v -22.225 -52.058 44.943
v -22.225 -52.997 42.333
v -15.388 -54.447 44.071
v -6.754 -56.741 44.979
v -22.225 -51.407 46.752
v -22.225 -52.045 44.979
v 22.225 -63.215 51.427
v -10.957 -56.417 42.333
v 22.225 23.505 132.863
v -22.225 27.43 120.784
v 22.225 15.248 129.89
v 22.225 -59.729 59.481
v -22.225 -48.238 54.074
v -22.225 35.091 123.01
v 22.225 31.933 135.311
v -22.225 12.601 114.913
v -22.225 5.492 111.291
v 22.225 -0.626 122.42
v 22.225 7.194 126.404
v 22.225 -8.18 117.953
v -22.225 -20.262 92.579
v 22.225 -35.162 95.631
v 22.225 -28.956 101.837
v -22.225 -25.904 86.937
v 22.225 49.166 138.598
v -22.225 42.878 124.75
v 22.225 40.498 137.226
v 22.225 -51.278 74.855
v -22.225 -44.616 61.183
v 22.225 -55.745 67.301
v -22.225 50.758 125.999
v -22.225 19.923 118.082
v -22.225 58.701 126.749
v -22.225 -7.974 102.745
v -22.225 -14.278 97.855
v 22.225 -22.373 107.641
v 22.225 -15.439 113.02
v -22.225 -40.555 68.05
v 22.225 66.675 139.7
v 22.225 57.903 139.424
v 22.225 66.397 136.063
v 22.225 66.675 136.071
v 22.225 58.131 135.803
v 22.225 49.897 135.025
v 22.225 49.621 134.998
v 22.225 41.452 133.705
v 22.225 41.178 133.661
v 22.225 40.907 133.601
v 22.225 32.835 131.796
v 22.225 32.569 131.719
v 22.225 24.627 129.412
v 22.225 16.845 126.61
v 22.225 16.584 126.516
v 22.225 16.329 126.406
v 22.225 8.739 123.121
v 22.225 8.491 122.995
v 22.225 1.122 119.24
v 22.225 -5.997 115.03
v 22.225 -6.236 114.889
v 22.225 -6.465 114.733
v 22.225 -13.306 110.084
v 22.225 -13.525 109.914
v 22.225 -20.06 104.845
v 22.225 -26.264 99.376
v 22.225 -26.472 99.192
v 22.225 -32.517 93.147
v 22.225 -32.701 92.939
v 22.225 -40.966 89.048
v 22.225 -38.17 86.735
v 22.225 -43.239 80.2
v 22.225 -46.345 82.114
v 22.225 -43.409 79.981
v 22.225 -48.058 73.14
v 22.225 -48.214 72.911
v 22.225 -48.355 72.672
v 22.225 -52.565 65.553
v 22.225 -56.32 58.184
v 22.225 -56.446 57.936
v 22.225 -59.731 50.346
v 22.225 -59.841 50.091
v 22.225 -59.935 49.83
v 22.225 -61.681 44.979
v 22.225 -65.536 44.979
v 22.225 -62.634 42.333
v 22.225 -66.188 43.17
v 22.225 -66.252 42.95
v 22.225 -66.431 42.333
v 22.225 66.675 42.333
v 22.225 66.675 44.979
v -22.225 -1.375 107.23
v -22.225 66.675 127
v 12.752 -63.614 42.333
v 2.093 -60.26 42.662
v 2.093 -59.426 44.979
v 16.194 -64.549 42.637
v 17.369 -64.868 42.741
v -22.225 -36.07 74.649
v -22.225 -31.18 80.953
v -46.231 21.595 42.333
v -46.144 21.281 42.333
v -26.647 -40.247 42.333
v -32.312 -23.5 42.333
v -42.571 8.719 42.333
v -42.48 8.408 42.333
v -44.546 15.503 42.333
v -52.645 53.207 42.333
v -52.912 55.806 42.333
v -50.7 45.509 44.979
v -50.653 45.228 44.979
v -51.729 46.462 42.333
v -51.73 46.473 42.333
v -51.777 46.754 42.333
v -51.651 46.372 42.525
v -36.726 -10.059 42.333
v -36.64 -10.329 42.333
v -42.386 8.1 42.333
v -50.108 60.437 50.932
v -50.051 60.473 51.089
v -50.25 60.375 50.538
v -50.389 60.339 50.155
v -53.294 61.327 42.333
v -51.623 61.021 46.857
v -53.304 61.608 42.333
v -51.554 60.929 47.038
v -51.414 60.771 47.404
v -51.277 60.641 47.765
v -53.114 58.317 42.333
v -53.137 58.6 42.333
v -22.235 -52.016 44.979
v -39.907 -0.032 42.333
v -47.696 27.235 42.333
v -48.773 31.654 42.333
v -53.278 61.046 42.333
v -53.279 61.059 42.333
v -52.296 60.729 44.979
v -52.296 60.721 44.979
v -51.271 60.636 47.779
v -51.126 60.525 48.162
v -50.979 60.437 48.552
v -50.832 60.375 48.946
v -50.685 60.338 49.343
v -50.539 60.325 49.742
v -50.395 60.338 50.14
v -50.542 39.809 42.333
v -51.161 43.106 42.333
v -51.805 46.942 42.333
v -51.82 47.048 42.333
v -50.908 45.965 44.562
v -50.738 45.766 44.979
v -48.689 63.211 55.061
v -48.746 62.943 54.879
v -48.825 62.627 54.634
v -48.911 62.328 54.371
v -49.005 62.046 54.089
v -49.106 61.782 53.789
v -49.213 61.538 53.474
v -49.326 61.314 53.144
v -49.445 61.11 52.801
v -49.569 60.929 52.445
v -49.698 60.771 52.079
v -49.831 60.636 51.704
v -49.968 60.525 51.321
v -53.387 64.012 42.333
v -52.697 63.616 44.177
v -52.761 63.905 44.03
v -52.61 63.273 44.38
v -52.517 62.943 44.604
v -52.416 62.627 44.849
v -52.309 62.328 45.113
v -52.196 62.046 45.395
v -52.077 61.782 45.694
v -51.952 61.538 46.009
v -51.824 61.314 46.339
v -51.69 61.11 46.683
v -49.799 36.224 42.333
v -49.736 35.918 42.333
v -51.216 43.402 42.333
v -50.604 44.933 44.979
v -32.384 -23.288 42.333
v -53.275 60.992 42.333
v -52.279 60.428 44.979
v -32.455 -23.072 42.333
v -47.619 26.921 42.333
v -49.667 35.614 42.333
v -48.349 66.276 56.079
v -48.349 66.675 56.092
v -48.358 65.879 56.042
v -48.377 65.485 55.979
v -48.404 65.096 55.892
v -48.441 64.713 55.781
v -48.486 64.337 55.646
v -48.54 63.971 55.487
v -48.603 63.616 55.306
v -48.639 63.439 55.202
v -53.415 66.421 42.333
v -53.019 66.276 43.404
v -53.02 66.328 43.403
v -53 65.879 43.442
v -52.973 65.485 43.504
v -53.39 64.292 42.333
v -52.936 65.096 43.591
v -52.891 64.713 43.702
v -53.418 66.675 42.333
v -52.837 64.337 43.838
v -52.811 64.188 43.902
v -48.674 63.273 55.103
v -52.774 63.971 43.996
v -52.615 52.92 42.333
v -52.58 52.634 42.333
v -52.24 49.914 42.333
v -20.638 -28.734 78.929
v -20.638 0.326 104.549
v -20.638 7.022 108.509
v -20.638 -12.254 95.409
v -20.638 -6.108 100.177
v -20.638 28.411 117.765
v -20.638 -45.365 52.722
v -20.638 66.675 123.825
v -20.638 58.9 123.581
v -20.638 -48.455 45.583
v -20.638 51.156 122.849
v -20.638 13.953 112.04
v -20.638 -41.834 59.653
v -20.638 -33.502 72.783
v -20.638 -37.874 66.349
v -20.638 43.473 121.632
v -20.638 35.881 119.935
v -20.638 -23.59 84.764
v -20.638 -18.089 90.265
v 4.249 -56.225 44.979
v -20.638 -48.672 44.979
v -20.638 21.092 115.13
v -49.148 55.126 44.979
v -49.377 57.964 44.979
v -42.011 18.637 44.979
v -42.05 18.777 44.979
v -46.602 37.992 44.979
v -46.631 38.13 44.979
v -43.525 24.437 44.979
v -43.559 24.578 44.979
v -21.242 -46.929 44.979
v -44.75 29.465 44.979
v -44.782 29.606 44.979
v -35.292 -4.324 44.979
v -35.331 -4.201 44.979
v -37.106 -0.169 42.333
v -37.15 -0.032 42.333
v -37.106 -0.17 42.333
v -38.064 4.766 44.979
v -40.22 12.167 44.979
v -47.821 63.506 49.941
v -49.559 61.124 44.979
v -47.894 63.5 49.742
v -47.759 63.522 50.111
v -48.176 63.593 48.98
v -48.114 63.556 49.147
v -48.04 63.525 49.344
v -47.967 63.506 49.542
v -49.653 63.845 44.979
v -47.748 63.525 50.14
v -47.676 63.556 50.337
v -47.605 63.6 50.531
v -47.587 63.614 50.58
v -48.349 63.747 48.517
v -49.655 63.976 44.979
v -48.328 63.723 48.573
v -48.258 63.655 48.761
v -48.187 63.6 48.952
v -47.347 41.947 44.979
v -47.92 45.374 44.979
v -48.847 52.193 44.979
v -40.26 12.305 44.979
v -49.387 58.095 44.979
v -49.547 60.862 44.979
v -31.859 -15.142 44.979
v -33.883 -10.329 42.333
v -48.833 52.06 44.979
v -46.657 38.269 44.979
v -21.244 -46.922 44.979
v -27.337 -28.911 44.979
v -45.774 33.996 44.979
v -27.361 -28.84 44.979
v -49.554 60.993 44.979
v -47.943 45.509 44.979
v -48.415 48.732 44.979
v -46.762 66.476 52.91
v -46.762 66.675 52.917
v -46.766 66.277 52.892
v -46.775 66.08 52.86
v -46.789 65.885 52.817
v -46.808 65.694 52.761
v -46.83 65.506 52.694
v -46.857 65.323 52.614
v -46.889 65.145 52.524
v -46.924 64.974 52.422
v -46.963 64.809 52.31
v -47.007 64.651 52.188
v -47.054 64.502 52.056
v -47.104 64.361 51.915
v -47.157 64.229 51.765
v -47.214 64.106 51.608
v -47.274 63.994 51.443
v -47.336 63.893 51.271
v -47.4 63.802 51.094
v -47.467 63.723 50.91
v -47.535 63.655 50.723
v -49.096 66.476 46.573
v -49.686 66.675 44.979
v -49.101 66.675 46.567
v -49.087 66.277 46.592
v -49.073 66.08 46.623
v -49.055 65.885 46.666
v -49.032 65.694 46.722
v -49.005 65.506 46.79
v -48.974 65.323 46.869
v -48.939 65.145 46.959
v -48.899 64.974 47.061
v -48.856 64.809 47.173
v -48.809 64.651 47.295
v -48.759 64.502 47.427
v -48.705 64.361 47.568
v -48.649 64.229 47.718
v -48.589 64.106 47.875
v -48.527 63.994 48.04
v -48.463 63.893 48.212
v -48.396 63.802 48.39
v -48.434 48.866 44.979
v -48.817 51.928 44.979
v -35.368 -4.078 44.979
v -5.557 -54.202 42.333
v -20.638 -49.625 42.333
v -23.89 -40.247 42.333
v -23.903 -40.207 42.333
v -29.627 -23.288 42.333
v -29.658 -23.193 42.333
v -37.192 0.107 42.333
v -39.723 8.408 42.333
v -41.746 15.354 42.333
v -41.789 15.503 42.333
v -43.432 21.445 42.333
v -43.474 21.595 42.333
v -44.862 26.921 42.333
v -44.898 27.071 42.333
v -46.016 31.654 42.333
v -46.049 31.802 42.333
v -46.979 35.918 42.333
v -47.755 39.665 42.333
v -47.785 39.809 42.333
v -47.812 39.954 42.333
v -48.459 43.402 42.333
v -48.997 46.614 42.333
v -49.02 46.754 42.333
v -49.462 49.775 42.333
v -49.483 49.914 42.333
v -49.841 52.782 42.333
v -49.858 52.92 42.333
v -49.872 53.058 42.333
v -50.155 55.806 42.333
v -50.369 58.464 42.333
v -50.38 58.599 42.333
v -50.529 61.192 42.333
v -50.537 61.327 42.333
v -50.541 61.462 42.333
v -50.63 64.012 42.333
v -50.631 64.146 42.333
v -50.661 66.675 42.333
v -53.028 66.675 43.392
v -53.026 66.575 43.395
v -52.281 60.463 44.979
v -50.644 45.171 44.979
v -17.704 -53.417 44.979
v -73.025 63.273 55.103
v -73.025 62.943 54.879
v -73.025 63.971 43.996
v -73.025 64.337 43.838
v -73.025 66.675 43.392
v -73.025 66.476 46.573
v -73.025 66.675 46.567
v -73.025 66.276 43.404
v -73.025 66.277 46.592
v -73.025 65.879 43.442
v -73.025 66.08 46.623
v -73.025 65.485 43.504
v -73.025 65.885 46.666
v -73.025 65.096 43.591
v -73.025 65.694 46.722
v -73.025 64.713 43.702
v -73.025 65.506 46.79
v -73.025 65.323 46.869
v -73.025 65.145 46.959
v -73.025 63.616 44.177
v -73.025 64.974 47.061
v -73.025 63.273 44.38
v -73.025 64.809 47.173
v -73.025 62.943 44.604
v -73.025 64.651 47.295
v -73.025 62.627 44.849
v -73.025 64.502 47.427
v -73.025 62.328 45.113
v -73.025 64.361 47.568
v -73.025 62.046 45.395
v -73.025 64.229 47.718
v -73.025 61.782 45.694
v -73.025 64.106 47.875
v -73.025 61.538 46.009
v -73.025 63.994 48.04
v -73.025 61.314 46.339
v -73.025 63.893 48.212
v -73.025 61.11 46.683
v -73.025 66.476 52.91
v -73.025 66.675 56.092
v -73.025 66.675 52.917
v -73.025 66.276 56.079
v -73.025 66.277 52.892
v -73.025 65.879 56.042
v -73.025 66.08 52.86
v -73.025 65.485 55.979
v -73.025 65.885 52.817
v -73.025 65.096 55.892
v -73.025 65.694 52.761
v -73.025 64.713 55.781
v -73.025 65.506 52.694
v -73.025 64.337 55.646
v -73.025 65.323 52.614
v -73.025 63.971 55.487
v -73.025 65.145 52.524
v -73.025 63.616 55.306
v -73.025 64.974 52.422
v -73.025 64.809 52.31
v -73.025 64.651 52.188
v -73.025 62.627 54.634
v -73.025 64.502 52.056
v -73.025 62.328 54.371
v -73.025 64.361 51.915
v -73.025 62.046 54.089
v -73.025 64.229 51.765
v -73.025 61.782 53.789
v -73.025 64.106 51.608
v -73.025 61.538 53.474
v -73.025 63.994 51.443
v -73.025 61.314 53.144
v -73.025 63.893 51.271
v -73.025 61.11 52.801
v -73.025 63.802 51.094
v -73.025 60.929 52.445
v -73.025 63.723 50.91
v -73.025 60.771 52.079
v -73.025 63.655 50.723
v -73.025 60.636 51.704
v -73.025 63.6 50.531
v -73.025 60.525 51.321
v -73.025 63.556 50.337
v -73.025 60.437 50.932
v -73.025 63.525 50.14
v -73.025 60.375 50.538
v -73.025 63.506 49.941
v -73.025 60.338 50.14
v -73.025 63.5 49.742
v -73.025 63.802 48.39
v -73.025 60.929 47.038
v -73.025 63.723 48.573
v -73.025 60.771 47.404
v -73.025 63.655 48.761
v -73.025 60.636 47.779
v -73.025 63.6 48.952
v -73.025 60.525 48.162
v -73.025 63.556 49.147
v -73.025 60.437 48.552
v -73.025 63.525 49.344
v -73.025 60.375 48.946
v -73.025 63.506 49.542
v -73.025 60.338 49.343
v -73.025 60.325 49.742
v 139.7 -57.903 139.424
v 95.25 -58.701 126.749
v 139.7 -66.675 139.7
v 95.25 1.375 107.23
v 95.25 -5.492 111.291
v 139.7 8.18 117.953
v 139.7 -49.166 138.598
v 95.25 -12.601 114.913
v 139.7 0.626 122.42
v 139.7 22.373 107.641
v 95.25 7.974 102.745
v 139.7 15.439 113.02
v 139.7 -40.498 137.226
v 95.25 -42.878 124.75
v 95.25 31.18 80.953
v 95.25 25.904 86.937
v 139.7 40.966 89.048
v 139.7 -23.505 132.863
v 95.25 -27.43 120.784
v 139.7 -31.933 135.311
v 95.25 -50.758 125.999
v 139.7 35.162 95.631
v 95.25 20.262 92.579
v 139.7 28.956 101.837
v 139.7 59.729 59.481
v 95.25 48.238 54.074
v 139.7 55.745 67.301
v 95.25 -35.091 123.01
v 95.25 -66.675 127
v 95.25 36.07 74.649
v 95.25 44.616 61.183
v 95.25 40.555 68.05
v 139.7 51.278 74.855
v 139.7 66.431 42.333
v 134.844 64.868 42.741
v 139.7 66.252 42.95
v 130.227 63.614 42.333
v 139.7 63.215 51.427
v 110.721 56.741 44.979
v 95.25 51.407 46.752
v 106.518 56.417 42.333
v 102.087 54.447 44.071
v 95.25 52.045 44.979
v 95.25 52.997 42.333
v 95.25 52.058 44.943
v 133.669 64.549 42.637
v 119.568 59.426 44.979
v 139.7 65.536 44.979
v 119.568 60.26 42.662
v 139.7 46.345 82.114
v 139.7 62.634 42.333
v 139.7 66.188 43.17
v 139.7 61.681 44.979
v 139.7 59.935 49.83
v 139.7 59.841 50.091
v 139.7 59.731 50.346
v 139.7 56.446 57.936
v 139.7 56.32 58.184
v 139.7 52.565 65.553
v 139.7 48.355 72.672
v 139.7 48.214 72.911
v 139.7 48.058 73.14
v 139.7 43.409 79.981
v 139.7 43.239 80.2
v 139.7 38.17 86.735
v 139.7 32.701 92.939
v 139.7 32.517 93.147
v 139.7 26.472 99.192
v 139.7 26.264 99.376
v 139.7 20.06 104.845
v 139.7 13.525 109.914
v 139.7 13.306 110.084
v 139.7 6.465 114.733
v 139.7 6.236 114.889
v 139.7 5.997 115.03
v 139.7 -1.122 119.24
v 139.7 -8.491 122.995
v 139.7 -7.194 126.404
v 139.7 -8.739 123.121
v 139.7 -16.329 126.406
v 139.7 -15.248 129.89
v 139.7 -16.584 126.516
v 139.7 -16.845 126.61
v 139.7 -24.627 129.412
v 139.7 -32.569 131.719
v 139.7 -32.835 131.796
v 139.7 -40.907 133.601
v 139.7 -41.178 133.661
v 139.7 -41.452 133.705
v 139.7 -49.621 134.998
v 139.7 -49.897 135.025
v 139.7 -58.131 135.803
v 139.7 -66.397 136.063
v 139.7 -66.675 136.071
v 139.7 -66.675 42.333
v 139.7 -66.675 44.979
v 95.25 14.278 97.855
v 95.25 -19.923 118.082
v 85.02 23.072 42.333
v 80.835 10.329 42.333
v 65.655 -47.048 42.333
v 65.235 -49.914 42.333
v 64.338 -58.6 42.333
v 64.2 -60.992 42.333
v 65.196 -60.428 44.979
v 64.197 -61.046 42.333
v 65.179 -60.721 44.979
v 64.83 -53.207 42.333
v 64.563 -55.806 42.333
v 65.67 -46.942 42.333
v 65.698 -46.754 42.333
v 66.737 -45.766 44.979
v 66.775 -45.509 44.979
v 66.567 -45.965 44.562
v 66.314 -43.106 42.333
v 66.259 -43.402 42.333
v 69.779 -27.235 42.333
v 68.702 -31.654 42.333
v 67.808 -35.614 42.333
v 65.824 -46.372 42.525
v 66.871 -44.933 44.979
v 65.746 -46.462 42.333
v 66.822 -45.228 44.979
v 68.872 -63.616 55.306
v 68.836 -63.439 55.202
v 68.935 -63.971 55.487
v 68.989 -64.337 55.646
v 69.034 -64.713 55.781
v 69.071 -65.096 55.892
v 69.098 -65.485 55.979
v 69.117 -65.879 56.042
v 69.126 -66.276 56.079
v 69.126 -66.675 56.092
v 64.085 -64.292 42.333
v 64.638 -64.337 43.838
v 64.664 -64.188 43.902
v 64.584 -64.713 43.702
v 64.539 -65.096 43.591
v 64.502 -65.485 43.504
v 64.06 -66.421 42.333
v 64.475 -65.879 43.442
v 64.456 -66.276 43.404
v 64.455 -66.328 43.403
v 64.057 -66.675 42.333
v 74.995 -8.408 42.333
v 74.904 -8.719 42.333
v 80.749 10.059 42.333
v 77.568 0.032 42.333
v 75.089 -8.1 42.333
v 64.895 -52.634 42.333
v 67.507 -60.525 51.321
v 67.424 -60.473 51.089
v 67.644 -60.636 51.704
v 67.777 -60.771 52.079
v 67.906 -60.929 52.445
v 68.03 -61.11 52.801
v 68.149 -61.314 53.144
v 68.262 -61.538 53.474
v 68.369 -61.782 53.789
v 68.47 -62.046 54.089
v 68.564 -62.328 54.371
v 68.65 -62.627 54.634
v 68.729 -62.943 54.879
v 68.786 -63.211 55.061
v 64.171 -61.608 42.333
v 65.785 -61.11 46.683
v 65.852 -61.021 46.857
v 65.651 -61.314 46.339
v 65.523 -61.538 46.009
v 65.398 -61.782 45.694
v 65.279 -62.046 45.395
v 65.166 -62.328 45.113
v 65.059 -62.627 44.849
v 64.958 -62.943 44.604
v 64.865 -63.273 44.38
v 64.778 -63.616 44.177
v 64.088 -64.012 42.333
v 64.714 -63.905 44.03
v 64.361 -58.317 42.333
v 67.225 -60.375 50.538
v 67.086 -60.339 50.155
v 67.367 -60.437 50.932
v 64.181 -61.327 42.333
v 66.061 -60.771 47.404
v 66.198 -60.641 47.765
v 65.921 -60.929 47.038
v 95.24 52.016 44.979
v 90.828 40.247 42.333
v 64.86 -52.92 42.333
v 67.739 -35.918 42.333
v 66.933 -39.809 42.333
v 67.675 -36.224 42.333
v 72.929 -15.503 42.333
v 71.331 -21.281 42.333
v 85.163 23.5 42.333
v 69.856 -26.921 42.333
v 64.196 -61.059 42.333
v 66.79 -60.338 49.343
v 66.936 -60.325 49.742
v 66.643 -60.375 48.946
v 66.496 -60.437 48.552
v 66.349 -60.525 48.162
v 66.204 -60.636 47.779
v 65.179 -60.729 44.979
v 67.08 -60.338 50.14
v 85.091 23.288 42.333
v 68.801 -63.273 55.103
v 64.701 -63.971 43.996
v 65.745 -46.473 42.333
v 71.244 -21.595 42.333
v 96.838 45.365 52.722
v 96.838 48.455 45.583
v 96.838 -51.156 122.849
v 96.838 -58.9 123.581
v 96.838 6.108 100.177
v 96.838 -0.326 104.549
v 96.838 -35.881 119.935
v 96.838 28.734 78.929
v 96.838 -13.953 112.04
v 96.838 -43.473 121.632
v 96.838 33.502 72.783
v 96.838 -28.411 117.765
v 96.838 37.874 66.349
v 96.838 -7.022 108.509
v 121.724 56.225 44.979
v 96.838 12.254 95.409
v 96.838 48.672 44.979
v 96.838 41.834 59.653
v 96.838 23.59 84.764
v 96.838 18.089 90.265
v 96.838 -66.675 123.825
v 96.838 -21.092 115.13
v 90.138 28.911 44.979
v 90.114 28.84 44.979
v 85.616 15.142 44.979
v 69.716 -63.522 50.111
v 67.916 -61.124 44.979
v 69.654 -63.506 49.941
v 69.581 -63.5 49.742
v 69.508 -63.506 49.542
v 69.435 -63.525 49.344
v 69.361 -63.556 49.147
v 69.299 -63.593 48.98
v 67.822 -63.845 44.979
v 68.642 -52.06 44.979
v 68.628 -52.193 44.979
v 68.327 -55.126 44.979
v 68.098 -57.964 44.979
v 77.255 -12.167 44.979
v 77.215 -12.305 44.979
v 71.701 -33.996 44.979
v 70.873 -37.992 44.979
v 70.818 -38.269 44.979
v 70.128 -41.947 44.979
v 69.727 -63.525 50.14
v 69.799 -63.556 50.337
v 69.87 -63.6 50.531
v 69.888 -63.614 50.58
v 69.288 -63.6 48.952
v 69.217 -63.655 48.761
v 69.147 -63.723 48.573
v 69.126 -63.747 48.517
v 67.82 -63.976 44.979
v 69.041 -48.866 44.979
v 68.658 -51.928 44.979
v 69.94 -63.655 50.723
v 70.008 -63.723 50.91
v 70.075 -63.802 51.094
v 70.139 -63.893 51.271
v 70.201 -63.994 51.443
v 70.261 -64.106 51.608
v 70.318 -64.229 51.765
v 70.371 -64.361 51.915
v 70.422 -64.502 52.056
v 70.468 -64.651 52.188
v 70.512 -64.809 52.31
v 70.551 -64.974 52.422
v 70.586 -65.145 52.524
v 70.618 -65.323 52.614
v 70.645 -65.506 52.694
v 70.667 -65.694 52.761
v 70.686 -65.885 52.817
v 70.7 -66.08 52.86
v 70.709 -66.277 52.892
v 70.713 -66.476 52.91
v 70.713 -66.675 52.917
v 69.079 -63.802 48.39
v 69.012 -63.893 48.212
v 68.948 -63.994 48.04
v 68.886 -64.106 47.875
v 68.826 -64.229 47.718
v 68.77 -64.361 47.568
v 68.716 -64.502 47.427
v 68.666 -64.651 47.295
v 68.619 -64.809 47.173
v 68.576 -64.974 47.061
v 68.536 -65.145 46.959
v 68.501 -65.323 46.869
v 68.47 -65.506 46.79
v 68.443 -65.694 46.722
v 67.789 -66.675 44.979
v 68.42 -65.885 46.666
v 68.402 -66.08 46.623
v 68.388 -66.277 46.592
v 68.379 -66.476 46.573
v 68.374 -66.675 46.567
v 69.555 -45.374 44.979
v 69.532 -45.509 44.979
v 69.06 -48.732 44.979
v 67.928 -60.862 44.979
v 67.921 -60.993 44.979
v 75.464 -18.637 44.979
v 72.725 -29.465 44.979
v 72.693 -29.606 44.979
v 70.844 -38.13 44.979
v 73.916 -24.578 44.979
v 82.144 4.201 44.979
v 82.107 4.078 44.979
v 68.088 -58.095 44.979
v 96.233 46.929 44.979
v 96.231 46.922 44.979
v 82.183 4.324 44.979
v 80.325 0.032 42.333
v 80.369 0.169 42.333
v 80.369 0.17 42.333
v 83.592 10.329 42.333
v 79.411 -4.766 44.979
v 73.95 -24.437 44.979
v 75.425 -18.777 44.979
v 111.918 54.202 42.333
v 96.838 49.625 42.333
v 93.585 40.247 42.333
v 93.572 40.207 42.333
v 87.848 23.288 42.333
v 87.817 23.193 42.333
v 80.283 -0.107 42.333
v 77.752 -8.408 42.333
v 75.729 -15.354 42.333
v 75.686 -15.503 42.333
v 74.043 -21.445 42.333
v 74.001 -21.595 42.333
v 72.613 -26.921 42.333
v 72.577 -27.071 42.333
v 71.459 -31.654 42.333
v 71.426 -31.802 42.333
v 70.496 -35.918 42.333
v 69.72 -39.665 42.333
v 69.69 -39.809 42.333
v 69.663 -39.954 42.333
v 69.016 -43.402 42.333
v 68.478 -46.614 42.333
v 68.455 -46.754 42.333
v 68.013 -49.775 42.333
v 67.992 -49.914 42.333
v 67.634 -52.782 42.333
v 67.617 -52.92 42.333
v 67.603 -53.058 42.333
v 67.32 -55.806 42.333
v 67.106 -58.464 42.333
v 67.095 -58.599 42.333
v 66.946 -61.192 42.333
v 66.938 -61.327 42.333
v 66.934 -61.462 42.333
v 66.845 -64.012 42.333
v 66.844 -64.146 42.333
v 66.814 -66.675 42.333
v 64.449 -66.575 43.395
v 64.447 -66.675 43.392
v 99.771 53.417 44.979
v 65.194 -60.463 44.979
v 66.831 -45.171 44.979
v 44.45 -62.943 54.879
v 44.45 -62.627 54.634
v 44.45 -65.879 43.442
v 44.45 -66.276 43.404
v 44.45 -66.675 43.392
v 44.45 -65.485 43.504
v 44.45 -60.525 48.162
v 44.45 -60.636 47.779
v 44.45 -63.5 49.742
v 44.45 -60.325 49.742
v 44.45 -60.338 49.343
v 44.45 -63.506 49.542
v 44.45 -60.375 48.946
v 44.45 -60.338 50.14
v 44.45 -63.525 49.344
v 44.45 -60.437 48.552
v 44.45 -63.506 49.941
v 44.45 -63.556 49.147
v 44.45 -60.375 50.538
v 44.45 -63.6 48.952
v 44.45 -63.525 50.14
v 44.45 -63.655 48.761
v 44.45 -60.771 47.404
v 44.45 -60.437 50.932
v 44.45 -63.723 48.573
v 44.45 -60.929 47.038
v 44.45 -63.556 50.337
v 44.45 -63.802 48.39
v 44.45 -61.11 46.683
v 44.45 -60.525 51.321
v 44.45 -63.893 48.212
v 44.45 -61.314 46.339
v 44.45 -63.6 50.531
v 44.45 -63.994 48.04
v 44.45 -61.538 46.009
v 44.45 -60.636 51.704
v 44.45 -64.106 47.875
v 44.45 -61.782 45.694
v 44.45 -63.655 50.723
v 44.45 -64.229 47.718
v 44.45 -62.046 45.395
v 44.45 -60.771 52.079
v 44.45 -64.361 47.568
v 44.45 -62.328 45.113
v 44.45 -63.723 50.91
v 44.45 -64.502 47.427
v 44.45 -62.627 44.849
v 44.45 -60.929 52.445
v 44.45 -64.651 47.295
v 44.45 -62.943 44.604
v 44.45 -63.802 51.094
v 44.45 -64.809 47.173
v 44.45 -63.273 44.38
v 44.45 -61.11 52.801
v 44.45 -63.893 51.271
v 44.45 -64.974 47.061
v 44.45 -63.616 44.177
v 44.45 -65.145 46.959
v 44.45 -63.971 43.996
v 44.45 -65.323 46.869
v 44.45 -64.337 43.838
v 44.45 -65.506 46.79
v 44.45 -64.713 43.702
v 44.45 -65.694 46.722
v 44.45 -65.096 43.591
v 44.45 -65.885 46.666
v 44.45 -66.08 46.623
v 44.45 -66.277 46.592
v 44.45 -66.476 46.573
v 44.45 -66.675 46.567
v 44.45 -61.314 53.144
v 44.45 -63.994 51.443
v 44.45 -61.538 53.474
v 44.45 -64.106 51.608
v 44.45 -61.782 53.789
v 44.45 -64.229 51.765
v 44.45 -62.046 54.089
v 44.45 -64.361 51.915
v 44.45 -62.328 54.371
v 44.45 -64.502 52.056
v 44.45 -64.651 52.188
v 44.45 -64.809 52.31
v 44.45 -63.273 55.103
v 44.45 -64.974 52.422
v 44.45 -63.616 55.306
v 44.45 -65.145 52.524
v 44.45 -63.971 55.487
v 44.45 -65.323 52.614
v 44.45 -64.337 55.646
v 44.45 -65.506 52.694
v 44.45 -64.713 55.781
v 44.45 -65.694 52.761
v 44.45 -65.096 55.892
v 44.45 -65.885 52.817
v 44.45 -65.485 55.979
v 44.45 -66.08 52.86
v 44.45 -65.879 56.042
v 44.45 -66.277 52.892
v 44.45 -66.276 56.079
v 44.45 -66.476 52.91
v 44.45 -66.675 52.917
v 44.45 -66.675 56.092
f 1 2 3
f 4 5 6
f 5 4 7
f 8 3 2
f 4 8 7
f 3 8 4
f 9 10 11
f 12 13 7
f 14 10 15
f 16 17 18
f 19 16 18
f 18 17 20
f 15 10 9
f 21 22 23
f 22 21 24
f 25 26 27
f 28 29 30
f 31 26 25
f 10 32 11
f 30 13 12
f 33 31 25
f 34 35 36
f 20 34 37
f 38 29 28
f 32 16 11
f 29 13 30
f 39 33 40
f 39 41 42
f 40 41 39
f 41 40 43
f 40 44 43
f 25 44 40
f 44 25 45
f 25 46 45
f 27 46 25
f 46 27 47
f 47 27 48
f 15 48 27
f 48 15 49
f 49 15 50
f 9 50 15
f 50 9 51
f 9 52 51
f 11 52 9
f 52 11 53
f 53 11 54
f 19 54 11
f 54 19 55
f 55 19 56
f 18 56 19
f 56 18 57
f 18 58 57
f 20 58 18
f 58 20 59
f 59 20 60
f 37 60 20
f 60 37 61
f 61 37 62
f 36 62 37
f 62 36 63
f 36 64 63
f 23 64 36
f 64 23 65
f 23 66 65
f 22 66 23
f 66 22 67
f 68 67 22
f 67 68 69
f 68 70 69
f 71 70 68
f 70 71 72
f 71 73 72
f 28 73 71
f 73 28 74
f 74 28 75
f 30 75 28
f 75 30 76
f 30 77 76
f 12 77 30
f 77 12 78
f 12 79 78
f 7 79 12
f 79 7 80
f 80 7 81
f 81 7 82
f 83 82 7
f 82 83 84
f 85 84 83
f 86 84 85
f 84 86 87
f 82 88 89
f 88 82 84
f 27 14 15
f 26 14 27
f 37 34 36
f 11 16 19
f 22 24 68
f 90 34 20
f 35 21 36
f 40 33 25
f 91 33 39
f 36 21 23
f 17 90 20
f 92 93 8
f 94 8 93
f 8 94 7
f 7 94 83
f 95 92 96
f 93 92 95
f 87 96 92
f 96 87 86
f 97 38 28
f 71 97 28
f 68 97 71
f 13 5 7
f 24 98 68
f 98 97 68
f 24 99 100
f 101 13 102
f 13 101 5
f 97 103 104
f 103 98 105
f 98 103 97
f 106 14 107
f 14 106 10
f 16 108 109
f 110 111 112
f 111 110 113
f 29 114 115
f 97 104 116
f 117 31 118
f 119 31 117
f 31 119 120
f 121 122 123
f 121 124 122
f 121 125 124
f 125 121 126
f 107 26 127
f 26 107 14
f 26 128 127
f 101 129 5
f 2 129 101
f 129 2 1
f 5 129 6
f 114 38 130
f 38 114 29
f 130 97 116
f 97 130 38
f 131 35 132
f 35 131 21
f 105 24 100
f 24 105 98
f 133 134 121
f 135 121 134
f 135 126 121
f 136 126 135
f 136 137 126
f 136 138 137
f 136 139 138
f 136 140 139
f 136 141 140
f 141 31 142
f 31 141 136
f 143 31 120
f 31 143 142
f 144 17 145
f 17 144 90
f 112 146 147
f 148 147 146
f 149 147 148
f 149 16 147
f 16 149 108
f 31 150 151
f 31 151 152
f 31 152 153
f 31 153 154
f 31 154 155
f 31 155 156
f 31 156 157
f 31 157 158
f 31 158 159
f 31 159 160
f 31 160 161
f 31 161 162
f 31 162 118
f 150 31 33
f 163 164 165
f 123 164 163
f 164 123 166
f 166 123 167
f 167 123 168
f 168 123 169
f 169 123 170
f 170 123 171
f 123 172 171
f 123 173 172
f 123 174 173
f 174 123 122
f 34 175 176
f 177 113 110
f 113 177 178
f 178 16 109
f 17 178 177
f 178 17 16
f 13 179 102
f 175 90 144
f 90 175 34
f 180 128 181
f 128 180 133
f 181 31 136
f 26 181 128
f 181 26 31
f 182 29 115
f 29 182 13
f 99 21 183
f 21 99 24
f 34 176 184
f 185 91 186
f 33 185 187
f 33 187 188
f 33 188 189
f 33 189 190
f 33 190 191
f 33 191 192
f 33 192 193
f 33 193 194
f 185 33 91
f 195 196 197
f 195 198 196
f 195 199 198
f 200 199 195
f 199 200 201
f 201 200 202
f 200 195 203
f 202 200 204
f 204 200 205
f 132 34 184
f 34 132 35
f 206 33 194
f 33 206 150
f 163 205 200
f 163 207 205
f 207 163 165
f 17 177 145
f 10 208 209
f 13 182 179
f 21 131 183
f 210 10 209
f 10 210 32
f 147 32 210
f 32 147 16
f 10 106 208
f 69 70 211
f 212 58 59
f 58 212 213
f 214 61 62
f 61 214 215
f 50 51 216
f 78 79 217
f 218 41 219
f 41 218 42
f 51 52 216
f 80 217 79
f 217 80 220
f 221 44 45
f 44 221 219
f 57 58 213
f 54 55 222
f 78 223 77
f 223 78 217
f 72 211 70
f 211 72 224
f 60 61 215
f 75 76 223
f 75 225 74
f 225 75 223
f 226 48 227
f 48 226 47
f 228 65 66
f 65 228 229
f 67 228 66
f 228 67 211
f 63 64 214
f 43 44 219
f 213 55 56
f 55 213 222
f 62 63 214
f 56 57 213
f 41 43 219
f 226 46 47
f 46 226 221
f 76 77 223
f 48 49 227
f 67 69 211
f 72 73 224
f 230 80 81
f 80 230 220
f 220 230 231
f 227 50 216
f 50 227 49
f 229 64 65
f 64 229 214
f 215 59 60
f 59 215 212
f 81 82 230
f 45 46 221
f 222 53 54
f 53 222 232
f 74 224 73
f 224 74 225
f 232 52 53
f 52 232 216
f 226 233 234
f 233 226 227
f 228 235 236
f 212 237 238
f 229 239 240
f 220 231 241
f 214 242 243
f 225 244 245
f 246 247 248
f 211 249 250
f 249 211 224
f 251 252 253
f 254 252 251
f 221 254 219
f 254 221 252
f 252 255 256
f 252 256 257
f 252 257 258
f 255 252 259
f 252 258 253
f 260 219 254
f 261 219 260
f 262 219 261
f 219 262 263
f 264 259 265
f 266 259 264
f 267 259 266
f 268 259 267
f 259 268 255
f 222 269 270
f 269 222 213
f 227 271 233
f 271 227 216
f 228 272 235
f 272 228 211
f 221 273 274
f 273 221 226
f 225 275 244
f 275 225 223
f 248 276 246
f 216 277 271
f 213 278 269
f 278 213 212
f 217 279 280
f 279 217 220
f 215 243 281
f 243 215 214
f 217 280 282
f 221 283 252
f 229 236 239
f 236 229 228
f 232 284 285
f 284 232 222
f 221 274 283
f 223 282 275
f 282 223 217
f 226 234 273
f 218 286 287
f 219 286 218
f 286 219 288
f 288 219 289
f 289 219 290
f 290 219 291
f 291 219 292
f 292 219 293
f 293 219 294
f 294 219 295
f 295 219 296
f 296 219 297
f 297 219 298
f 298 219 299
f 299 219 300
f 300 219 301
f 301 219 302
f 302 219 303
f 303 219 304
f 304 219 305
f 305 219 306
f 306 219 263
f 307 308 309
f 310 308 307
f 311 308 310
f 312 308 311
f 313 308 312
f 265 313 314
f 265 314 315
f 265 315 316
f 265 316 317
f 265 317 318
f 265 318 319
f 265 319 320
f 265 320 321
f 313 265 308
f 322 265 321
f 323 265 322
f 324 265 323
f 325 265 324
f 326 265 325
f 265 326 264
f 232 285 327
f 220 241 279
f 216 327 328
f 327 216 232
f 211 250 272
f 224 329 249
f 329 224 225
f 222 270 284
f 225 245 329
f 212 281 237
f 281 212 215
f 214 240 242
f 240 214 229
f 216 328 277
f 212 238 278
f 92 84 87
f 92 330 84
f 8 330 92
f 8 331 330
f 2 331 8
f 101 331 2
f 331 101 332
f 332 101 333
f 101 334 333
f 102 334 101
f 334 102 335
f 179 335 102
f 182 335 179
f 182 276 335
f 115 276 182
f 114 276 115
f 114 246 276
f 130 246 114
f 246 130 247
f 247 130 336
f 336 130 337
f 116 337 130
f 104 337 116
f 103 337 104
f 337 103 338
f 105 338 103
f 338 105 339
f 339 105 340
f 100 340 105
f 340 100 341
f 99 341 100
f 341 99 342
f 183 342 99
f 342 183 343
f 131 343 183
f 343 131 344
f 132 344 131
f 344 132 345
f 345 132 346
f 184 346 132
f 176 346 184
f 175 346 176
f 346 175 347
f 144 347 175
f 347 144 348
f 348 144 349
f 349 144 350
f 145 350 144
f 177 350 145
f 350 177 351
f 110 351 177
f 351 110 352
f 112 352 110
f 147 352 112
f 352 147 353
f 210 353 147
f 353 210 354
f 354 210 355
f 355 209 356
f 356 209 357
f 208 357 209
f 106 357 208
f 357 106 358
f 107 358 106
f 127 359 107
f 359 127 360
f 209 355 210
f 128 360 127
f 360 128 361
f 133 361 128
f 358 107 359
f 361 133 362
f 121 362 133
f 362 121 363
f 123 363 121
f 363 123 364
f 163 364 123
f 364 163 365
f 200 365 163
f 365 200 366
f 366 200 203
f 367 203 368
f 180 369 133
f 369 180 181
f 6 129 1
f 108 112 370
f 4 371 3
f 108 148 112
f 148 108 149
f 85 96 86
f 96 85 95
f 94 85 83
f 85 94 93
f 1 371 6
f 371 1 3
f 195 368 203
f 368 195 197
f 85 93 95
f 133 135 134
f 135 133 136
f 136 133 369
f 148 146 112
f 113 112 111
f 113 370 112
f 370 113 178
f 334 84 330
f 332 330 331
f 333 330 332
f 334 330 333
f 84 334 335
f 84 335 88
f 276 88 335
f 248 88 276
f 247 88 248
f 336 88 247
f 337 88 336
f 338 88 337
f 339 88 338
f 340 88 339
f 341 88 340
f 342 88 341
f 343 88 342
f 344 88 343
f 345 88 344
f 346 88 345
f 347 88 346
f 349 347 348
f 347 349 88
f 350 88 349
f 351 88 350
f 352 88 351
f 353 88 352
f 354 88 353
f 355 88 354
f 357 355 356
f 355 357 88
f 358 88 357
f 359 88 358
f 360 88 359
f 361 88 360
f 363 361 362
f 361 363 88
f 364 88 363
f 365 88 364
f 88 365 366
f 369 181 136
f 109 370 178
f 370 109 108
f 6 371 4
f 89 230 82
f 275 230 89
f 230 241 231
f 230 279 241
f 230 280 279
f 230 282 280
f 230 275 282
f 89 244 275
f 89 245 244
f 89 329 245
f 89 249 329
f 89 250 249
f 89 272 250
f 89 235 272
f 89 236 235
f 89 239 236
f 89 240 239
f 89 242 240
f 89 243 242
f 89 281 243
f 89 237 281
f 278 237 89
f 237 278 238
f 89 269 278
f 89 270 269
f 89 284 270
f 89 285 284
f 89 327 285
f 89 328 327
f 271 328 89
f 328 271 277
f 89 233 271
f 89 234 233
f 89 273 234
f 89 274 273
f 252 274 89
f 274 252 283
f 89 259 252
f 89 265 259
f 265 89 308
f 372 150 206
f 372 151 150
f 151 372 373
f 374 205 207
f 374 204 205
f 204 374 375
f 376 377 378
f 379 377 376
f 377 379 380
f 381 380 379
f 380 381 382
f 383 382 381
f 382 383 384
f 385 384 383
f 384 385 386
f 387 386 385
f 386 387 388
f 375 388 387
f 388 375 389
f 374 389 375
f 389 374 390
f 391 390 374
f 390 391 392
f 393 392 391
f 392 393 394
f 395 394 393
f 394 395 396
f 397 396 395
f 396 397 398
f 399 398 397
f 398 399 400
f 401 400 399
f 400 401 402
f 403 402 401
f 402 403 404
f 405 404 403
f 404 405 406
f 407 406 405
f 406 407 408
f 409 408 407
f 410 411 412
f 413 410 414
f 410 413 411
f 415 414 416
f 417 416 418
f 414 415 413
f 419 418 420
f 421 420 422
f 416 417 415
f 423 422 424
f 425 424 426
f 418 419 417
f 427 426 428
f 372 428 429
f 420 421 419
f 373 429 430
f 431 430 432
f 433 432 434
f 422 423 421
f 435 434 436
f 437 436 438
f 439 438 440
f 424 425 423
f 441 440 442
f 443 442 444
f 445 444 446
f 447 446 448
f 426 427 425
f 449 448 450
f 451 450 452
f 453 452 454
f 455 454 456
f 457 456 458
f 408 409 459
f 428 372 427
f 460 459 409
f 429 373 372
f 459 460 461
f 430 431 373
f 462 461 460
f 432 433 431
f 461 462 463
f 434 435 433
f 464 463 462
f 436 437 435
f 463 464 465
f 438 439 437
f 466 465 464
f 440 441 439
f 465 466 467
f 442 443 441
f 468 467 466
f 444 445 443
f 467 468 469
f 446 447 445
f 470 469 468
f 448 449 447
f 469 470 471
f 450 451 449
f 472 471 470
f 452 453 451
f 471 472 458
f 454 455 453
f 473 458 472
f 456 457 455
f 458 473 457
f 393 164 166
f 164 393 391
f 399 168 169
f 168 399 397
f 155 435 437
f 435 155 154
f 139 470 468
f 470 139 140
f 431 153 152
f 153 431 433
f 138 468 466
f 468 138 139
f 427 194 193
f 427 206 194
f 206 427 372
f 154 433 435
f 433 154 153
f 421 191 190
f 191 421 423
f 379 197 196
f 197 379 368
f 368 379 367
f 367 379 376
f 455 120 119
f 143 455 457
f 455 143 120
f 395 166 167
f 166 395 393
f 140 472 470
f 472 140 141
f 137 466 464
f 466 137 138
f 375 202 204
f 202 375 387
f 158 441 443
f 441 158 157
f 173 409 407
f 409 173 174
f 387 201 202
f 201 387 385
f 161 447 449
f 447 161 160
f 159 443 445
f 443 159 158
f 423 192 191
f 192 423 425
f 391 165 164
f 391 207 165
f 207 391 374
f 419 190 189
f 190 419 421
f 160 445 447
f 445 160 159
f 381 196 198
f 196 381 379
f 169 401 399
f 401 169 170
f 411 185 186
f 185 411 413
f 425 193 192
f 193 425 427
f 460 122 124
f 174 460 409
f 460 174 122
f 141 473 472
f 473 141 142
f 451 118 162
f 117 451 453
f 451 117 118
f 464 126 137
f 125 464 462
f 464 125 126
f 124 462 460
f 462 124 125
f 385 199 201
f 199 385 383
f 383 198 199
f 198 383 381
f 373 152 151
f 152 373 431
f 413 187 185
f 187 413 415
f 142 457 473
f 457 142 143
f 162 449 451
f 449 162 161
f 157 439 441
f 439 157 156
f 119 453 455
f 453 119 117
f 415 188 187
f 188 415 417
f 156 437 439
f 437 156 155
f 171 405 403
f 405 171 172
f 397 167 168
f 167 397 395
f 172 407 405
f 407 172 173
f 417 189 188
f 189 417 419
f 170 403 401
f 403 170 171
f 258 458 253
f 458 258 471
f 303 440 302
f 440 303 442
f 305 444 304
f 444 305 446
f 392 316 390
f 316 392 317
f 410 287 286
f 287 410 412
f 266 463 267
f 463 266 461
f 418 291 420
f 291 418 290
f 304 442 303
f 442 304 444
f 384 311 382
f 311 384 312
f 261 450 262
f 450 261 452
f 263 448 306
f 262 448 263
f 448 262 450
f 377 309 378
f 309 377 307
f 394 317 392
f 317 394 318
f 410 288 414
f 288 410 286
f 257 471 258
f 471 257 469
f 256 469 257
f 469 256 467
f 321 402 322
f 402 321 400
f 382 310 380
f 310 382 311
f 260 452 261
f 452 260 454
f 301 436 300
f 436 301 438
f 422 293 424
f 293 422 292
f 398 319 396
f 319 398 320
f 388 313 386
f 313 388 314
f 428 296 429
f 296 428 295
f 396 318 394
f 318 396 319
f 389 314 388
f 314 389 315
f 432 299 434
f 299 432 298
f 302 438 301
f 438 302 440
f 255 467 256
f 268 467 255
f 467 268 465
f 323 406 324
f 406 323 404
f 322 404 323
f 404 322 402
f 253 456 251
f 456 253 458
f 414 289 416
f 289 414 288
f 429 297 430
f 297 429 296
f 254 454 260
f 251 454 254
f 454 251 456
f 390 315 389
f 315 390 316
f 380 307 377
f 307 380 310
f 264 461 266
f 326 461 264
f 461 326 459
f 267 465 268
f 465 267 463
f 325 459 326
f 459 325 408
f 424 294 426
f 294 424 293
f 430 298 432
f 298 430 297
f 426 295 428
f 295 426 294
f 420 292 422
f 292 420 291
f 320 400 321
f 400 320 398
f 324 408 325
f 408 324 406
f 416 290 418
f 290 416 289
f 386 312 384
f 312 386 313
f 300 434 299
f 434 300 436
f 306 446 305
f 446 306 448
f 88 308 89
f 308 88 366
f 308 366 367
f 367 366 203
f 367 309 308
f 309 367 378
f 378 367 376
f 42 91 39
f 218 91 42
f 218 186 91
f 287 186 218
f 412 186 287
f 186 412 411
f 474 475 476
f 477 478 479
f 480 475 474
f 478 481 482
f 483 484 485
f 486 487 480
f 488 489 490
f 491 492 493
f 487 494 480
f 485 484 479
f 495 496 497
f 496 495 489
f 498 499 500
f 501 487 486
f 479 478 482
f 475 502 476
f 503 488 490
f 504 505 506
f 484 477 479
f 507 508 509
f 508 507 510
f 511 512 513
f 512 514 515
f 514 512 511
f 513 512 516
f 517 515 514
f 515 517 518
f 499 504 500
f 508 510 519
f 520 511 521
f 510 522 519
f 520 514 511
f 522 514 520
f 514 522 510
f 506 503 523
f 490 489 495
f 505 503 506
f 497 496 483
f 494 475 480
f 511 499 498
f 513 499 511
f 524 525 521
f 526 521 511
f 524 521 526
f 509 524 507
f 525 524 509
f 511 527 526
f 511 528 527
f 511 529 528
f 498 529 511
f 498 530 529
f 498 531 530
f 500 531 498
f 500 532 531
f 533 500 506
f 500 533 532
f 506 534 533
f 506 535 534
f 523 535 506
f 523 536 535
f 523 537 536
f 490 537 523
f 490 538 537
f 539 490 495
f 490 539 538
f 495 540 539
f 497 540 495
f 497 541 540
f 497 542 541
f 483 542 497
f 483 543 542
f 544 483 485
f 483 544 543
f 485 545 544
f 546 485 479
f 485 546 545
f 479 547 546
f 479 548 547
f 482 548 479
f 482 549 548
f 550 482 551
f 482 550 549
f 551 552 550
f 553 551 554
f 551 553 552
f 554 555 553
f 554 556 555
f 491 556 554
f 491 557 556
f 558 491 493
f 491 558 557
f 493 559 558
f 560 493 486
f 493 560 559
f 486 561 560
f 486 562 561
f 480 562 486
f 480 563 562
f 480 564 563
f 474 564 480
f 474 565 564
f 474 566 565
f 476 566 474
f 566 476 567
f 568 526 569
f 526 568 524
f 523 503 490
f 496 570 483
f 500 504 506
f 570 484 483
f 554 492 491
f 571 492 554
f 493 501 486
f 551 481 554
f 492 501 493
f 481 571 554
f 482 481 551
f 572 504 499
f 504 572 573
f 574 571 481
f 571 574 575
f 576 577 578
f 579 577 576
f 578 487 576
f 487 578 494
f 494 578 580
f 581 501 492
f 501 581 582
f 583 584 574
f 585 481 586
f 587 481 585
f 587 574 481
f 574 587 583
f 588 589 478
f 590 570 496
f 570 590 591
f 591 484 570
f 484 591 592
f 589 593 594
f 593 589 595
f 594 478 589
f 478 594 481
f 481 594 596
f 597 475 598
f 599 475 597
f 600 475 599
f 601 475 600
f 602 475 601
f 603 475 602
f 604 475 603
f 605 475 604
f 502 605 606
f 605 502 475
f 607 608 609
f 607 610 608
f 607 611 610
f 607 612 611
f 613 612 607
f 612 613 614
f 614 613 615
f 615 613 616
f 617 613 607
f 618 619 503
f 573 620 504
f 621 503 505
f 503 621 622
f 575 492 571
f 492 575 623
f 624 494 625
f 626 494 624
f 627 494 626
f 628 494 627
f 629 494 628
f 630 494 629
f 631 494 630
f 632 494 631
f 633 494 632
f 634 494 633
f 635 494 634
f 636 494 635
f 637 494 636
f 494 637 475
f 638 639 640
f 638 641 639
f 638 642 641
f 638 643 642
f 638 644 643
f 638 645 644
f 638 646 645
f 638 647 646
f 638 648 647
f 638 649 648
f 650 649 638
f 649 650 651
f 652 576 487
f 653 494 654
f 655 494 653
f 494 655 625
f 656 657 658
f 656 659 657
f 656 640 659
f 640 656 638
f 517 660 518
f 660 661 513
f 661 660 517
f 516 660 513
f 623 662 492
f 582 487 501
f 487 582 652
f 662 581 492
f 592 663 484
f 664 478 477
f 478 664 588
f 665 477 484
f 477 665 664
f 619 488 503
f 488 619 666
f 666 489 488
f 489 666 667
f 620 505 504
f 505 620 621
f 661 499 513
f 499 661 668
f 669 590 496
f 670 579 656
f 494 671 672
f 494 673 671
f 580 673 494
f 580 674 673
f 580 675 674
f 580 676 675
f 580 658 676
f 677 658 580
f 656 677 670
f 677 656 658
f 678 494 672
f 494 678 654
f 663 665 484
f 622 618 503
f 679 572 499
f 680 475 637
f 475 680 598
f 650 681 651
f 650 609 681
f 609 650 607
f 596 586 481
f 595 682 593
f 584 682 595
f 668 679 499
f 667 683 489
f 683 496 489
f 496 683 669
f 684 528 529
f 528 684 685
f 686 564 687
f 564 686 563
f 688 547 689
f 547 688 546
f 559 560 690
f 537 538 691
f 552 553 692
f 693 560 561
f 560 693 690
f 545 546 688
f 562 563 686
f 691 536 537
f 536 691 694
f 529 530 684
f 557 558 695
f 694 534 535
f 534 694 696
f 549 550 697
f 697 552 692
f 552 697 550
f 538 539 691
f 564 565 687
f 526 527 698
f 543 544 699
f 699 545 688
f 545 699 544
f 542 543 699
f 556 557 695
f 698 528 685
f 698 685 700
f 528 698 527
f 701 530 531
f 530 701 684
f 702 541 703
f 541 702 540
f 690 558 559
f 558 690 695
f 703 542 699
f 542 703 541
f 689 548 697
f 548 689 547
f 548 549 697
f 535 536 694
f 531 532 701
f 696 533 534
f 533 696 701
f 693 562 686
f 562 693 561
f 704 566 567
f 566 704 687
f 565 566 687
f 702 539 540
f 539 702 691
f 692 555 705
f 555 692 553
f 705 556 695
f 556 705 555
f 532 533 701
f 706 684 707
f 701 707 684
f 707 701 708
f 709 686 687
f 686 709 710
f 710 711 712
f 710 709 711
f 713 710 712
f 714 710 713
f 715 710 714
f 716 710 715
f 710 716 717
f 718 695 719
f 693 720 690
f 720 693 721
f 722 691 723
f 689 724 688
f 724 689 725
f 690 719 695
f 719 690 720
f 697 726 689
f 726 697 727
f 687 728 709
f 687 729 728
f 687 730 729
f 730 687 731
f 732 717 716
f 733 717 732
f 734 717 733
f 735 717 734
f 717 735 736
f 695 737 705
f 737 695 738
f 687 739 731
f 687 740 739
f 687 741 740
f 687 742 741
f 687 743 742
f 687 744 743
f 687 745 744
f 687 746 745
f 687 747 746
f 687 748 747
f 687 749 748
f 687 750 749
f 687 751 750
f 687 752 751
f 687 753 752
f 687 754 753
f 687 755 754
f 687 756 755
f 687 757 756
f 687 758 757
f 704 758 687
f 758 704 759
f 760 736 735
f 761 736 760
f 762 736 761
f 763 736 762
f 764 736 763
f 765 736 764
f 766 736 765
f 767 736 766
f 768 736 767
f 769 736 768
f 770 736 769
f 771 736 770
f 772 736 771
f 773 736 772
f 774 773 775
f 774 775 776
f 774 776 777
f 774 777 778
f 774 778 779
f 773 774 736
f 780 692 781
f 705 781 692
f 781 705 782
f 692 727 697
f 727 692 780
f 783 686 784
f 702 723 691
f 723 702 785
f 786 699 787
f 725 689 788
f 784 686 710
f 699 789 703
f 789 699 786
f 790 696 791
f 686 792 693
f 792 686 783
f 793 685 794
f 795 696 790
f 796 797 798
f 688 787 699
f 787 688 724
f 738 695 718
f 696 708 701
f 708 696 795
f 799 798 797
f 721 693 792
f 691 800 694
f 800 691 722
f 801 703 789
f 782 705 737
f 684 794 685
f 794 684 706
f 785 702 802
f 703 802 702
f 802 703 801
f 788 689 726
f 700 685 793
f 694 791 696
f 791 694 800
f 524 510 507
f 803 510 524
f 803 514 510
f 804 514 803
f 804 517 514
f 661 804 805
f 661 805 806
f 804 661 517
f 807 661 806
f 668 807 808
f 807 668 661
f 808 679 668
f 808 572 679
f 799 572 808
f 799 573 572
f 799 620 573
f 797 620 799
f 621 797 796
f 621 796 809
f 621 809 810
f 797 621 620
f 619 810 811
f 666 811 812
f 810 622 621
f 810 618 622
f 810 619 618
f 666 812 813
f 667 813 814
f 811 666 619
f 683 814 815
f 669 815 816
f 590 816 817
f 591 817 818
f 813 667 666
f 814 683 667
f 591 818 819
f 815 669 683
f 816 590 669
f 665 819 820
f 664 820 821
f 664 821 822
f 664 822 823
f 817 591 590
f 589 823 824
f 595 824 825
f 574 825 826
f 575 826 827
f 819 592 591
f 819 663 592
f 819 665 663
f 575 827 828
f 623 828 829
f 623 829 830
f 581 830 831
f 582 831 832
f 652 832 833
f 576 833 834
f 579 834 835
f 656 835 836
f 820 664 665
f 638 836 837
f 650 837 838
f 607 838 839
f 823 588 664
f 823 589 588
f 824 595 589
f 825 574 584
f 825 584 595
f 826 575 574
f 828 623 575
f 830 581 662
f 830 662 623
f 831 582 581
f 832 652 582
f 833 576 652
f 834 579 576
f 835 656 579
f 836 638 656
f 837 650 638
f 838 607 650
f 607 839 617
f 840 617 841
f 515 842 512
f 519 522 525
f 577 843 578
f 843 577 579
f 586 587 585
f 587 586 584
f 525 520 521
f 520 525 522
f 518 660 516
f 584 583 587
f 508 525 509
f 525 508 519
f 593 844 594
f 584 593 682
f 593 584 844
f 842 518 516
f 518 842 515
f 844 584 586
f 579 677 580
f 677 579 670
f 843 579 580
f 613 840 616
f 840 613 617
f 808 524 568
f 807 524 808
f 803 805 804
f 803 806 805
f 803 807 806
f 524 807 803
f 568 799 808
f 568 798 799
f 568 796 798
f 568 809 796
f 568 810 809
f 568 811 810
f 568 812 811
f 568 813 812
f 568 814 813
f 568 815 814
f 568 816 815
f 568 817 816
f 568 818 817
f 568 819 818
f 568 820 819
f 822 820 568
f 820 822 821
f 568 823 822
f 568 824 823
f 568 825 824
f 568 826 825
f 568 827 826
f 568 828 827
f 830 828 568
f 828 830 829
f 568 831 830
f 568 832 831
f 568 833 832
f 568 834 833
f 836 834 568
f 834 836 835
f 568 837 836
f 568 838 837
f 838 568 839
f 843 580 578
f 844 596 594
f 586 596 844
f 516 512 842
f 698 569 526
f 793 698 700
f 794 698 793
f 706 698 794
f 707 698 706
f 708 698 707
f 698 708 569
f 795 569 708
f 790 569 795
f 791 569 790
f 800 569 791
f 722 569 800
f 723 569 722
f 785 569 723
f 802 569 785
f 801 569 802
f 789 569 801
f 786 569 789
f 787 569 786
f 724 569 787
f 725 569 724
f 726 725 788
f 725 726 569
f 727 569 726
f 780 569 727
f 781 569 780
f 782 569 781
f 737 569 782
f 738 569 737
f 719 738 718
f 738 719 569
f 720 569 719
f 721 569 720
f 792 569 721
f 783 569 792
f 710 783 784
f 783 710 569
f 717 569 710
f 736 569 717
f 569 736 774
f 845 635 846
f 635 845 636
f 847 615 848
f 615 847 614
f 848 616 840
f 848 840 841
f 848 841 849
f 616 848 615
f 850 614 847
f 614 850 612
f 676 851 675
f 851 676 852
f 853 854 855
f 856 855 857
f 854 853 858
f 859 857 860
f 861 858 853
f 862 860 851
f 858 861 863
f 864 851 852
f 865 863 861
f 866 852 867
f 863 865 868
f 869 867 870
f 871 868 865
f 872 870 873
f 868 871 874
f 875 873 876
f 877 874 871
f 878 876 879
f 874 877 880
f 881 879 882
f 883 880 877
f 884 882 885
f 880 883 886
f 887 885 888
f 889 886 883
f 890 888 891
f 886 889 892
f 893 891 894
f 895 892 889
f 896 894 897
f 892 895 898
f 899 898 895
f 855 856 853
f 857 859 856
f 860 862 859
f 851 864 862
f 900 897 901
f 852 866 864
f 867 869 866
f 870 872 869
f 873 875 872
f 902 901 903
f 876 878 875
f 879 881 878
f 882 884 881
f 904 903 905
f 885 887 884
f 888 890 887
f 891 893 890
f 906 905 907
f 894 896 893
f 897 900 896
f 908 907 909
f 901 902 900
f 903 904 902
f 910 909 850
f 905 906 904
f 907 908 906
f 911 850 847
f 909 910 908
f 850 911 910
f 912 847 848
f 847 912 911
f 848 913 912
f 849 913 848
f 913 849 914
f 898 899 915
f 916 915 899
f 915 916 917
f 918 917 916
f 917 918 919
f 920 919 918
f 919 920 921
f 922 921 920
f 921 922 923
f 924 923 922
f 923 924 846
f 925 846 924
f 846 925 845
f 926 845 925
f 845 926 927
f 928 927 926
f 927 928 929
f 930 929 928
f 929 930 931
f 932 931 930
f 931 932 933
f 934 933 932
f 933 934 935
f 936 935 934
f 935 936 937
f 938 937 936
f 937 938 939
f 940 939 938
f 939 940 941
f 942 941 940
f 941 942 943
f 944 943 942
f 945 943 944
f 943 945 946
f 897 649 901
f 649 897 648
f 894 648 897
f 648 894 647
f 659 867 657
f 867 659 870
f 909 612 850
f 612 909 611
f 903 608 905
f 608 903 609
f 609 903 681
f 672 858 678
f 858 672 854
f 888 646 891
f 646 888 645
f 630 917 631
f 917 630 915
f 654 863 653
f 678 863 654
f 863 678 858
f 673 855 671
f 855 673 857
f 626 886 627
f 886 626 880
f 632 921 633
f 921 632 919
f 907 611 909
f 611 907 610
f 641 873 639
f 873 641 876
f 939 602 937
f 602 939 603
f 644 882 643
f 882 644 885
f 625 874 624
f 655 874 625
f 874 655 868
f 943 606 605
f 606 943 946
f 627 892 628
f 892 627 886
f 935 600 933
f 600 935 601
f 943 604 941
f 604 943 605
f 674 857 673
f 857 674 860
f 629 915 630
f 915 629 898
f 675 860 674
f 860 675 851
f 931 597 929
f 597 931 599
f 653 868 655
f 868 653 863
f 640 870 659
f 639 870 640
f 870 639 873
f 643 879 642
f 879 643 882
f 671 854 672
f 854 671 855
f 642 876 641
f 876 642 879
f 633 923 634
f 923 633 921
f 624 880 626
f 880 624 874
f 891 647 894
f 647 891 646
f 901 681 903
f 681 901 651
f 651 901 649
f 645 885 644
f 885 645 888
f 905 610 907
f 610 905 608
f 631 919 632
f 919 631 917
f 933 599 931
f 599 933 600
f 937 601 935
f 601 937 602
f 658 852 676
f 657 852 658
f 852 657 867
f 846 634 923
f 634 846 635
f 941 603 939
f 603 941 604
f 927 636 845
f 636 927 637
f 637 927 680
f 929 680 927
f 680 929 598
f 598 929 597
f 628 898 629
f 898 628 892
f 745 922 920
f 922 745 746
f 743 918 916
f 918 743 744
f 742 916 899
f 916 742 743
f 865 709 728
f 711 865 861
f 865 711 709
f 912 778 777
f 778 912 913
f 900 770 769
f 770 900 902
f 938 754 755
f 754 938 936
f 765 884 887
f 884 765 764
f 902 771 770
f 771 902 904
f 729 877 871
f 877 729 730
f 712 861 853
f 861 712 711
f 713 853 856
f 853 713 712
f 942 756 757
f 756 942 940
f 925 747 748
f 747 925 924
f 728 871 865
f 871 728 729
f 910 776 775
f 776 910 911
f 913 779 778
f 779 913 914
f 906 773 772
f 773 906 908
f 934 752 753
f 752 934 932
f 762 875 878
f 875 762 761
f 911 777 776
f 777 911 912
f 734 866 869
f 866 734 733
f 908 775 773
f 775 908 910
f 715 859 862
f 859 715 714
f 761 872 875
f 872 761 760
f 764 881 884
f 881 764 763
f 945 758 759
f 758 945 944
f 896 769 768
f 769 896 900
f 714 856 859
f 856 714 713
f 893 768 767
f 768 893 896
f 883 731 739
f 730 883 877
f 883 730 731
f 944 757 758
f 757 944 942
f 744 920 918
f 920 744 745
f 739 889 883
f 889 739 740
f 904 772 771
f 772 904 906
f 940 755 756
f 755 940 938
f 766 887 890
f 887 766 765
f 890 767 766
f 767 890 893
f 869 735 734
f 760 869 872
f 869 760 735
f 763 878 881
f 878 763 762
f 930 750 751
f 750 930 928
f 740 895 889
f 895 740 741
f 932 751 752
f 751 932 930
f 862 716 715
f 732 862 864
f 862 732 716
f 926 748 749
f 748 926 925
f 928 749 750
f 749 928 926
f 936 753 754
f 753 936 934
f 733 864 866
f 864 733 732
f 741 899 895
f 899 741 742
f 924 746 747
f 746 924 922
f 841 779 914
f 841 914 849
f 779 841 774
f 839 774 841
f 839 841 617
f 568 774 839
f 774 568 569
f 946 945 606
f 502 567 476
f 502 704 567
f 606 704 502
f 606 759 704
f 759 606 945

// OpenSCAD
//FIX CUTOFF AMOUNT NOT PARAMETRIC YET
//NEED TO COMMENT OUT ALL FUNCTIONS

//The diameter of the bucket being used.
bucketDiameter = 11;

//The height of the first stage (the top stage) of the urine diverter.
stage1Height = 1.75;

//The height of the second stage (the bottom stage) of the urine diverter.
stage2Height = 1.75;

//What diameter Stage 1 reduces to.
stage1Reduction = 10;
//What diameter stage 2 reduces to.
stage2Reduction = 0.5;

//How much length-wise of the diverter is kept. Typical value between 1/2 and 1/3.
cutoffAmount = 1/3;


//Detail of all circular and spherical objects. Essentially amount of sides. Value between 30 and 100 is standard.
sfn=100;

//The overall thickness of the diverter.
thickness = 0.125;

//The length of the tube protruding from the end of the bottom tube.
tubeLength = 0.75;

//The amount that cut holes will overlap. Value between 0.1 and 1.5 or so should be fine.
overlap = 1;

// - ? Will patch this later
cutoff=0;

//Amount to cutoff when I simply need to pierce everything. 
largeNumber = 100;

//The distance between the two halves of the diverter when printing.
distBetween = 2.5;

//The overlap of the tube with the diverter. With a value of 0, there is no solid bridge between the tube at the end and the bottom of the diverter.
tubeOverlap = 1;

//Mode 1 is the two pieces of the diverter separated, and mode 2 is the two pieces together in assembled form. 
mode = 1;

//The reciprocal of the cutoff variable/amount of the diverter that is kept. 
cutoffRecip = 1/cutoffAmount;

//Computed variables
diverterHeight = stage1Height+stage2Height+tubeLength;

module mainDiverter() {
    difference() {
        union() {
            //Adding the two main cylinders together - adding stage 1 and stage 2 together (NOTE - test diameter stuff later!). R2s/D2s are different because these need to slope down to get to the adapted diameter (variables stage1Reduction and stage2Reduction) above. 
            cylinder(r2=bucketDiameter/2, r1=stage1Reduction/2, h=stage1Height, $fn=sfn, center=true);
            translate([0,0,(stage1Height+stage2Height)/-2]) {
                cylinder(r2=stage1Reduction/2, r1=stage2Reduction/2, h=stage2Height, $fn=sfn, center=true);
            }
        }
        //Hollowing the top and bottom stages by removing cylinders the same size, except minus the thickness to leave nothing but  the thickness.
        translate([0,0,thickness/2]) {
             cylinder(r2=(bucketDiameter-thickness*2)/2, r1=(stage1Reduction-thickness*2)/2, h=stage1Height, $fn=sfn, center=true);
        }
        translate([0,0,(stage1Height+stage2Height-thickness)/-2]) {
                cylinder(r2=(stage1Reduction-thickness*2)/2, r1=(stage2Reduction-thickness*2)/2, h=stage2Height, $fn=sfn, center=true);
        }
    }
}

module partialDiverter() {
    difference() {
        mainDiverter();
        //Cutting the main diverter in half/into a fraction that is whatever the cutoff amount is.
        //CLARIFY what the translate statement does
        translate([(bucketDiameter+stage2Reduction)/cutoffRecip, 0, (stage1Height+overlap-cutoff)/-2]) {
            //A cube that is exactly the size of the main diverter. Translated to determine how much is actually cutoff. Clarify cutoff variable inside. 
            cube([bucketDiameter, bucketDiameter, stage1Height+stage2Height+tubeLength+overlap-cutoff], center=true);
        }
    }
}



module coverGuard() {
    intersection() {
        //Taking a whole version (no holes) of the main diverter.
        hull() translate([bucketDiameter/cutoffRecip, 0,0]) partialDiverter();
        translate([bucketDiameter/(1/cutoffAmount)/2+thickness,0,(stage1Height/2+thickness+cutoff/2)/-1]) {
            //Taking the intersection of a small cube and a completely convex version of the main piece. This will produce a completely flat cover that adapts perfectly to the shape of the main diverter.
            cube([thickness, bucketDiameter, (stage1Height+stage2Height-cutoff/2+thickness*2)], center=true);
        }
    }  
}

module tube() {
    difference() {
        //Explain translate statement later.
        translate([(bucketDiameter/(-1/cutoffAmount))/2-thickness,0,(stage1Height/2+stage2Height/2+tubeLength)/-1+tubeOverlap]) cylinder(r=stage2Reduction/2, h=tubeLength+tubeOverlap*2, $fn=sfn, center=true);
       hull() partialDiverter(); 
    }
}

module fullDiverter() {
    difference() {
        union() {
            //Adding the partial diverter, cover (for closing off the diverter) amd then the tube.
            partialDiverter();
            translate([bucketDiameter/(-1/cutoffAmount),0,0]) coverGuard();
            tube();
        }
        //Then, subtracting the inside portion of the tube (hole) so that water/urine can actually pass through.
       translate([(bucketDiameter/(-1/cutoffAmount))/2-thickness,0,(stage1Height/2+stage2Height/2+tubeLength)/-1+overlap]) cylinder(r=(stage2Reduction-thickness*2)/2, h=largeNumber, center=true, $fn=sfn);
    }
}

//NOTE - NEED TO FIX IN OPENSCAD TO MAKE SURE THIS WORKS WITH THE PROPORTIONS.
module separation() {
    //Separating the two pieces for easier printing on smaller 3D printers.
    translate([0,bucketDiameter/4-thickness,0]) rotate([0,90,0]) difference() {
        fullDiverter();
        translate([0,bucketDiameter/4,(diverterHeight+thickness*2)/-4]) cube([bucketDiameter, bucketDiameter/2, diverterHeight+thickness*2], center=true);
    }
    translate([diverterHeight/2+distBetween,bucketDiameter/-4+thickness,0]) rotate([0,90,0]) difference() {
    fullDiverter();
    translate([0,bucketDiameter/-4,(diverterHeight+thickness*2)/-4]) cube([bucketDiameter, bucketDiameter/2, diverterHeight+thickness*2], center=true);
}
}
    
module final() {
    //All variables are in imperial and OpenSCAD runs in metric. This is scaling the WHOLE MODEL up by x25.4 to convert everything easily from imperial to metric.
    scale([25.4, 25.4, 25.4])  {
        //If the mode is 1, add the separated pieces, and if the mode is 2, add the assembled diverter.
        if(mode == 1) {
            separation();
        }
        else if(mode == 2) {
            fullDiverter();
        }
    }
}
final();
